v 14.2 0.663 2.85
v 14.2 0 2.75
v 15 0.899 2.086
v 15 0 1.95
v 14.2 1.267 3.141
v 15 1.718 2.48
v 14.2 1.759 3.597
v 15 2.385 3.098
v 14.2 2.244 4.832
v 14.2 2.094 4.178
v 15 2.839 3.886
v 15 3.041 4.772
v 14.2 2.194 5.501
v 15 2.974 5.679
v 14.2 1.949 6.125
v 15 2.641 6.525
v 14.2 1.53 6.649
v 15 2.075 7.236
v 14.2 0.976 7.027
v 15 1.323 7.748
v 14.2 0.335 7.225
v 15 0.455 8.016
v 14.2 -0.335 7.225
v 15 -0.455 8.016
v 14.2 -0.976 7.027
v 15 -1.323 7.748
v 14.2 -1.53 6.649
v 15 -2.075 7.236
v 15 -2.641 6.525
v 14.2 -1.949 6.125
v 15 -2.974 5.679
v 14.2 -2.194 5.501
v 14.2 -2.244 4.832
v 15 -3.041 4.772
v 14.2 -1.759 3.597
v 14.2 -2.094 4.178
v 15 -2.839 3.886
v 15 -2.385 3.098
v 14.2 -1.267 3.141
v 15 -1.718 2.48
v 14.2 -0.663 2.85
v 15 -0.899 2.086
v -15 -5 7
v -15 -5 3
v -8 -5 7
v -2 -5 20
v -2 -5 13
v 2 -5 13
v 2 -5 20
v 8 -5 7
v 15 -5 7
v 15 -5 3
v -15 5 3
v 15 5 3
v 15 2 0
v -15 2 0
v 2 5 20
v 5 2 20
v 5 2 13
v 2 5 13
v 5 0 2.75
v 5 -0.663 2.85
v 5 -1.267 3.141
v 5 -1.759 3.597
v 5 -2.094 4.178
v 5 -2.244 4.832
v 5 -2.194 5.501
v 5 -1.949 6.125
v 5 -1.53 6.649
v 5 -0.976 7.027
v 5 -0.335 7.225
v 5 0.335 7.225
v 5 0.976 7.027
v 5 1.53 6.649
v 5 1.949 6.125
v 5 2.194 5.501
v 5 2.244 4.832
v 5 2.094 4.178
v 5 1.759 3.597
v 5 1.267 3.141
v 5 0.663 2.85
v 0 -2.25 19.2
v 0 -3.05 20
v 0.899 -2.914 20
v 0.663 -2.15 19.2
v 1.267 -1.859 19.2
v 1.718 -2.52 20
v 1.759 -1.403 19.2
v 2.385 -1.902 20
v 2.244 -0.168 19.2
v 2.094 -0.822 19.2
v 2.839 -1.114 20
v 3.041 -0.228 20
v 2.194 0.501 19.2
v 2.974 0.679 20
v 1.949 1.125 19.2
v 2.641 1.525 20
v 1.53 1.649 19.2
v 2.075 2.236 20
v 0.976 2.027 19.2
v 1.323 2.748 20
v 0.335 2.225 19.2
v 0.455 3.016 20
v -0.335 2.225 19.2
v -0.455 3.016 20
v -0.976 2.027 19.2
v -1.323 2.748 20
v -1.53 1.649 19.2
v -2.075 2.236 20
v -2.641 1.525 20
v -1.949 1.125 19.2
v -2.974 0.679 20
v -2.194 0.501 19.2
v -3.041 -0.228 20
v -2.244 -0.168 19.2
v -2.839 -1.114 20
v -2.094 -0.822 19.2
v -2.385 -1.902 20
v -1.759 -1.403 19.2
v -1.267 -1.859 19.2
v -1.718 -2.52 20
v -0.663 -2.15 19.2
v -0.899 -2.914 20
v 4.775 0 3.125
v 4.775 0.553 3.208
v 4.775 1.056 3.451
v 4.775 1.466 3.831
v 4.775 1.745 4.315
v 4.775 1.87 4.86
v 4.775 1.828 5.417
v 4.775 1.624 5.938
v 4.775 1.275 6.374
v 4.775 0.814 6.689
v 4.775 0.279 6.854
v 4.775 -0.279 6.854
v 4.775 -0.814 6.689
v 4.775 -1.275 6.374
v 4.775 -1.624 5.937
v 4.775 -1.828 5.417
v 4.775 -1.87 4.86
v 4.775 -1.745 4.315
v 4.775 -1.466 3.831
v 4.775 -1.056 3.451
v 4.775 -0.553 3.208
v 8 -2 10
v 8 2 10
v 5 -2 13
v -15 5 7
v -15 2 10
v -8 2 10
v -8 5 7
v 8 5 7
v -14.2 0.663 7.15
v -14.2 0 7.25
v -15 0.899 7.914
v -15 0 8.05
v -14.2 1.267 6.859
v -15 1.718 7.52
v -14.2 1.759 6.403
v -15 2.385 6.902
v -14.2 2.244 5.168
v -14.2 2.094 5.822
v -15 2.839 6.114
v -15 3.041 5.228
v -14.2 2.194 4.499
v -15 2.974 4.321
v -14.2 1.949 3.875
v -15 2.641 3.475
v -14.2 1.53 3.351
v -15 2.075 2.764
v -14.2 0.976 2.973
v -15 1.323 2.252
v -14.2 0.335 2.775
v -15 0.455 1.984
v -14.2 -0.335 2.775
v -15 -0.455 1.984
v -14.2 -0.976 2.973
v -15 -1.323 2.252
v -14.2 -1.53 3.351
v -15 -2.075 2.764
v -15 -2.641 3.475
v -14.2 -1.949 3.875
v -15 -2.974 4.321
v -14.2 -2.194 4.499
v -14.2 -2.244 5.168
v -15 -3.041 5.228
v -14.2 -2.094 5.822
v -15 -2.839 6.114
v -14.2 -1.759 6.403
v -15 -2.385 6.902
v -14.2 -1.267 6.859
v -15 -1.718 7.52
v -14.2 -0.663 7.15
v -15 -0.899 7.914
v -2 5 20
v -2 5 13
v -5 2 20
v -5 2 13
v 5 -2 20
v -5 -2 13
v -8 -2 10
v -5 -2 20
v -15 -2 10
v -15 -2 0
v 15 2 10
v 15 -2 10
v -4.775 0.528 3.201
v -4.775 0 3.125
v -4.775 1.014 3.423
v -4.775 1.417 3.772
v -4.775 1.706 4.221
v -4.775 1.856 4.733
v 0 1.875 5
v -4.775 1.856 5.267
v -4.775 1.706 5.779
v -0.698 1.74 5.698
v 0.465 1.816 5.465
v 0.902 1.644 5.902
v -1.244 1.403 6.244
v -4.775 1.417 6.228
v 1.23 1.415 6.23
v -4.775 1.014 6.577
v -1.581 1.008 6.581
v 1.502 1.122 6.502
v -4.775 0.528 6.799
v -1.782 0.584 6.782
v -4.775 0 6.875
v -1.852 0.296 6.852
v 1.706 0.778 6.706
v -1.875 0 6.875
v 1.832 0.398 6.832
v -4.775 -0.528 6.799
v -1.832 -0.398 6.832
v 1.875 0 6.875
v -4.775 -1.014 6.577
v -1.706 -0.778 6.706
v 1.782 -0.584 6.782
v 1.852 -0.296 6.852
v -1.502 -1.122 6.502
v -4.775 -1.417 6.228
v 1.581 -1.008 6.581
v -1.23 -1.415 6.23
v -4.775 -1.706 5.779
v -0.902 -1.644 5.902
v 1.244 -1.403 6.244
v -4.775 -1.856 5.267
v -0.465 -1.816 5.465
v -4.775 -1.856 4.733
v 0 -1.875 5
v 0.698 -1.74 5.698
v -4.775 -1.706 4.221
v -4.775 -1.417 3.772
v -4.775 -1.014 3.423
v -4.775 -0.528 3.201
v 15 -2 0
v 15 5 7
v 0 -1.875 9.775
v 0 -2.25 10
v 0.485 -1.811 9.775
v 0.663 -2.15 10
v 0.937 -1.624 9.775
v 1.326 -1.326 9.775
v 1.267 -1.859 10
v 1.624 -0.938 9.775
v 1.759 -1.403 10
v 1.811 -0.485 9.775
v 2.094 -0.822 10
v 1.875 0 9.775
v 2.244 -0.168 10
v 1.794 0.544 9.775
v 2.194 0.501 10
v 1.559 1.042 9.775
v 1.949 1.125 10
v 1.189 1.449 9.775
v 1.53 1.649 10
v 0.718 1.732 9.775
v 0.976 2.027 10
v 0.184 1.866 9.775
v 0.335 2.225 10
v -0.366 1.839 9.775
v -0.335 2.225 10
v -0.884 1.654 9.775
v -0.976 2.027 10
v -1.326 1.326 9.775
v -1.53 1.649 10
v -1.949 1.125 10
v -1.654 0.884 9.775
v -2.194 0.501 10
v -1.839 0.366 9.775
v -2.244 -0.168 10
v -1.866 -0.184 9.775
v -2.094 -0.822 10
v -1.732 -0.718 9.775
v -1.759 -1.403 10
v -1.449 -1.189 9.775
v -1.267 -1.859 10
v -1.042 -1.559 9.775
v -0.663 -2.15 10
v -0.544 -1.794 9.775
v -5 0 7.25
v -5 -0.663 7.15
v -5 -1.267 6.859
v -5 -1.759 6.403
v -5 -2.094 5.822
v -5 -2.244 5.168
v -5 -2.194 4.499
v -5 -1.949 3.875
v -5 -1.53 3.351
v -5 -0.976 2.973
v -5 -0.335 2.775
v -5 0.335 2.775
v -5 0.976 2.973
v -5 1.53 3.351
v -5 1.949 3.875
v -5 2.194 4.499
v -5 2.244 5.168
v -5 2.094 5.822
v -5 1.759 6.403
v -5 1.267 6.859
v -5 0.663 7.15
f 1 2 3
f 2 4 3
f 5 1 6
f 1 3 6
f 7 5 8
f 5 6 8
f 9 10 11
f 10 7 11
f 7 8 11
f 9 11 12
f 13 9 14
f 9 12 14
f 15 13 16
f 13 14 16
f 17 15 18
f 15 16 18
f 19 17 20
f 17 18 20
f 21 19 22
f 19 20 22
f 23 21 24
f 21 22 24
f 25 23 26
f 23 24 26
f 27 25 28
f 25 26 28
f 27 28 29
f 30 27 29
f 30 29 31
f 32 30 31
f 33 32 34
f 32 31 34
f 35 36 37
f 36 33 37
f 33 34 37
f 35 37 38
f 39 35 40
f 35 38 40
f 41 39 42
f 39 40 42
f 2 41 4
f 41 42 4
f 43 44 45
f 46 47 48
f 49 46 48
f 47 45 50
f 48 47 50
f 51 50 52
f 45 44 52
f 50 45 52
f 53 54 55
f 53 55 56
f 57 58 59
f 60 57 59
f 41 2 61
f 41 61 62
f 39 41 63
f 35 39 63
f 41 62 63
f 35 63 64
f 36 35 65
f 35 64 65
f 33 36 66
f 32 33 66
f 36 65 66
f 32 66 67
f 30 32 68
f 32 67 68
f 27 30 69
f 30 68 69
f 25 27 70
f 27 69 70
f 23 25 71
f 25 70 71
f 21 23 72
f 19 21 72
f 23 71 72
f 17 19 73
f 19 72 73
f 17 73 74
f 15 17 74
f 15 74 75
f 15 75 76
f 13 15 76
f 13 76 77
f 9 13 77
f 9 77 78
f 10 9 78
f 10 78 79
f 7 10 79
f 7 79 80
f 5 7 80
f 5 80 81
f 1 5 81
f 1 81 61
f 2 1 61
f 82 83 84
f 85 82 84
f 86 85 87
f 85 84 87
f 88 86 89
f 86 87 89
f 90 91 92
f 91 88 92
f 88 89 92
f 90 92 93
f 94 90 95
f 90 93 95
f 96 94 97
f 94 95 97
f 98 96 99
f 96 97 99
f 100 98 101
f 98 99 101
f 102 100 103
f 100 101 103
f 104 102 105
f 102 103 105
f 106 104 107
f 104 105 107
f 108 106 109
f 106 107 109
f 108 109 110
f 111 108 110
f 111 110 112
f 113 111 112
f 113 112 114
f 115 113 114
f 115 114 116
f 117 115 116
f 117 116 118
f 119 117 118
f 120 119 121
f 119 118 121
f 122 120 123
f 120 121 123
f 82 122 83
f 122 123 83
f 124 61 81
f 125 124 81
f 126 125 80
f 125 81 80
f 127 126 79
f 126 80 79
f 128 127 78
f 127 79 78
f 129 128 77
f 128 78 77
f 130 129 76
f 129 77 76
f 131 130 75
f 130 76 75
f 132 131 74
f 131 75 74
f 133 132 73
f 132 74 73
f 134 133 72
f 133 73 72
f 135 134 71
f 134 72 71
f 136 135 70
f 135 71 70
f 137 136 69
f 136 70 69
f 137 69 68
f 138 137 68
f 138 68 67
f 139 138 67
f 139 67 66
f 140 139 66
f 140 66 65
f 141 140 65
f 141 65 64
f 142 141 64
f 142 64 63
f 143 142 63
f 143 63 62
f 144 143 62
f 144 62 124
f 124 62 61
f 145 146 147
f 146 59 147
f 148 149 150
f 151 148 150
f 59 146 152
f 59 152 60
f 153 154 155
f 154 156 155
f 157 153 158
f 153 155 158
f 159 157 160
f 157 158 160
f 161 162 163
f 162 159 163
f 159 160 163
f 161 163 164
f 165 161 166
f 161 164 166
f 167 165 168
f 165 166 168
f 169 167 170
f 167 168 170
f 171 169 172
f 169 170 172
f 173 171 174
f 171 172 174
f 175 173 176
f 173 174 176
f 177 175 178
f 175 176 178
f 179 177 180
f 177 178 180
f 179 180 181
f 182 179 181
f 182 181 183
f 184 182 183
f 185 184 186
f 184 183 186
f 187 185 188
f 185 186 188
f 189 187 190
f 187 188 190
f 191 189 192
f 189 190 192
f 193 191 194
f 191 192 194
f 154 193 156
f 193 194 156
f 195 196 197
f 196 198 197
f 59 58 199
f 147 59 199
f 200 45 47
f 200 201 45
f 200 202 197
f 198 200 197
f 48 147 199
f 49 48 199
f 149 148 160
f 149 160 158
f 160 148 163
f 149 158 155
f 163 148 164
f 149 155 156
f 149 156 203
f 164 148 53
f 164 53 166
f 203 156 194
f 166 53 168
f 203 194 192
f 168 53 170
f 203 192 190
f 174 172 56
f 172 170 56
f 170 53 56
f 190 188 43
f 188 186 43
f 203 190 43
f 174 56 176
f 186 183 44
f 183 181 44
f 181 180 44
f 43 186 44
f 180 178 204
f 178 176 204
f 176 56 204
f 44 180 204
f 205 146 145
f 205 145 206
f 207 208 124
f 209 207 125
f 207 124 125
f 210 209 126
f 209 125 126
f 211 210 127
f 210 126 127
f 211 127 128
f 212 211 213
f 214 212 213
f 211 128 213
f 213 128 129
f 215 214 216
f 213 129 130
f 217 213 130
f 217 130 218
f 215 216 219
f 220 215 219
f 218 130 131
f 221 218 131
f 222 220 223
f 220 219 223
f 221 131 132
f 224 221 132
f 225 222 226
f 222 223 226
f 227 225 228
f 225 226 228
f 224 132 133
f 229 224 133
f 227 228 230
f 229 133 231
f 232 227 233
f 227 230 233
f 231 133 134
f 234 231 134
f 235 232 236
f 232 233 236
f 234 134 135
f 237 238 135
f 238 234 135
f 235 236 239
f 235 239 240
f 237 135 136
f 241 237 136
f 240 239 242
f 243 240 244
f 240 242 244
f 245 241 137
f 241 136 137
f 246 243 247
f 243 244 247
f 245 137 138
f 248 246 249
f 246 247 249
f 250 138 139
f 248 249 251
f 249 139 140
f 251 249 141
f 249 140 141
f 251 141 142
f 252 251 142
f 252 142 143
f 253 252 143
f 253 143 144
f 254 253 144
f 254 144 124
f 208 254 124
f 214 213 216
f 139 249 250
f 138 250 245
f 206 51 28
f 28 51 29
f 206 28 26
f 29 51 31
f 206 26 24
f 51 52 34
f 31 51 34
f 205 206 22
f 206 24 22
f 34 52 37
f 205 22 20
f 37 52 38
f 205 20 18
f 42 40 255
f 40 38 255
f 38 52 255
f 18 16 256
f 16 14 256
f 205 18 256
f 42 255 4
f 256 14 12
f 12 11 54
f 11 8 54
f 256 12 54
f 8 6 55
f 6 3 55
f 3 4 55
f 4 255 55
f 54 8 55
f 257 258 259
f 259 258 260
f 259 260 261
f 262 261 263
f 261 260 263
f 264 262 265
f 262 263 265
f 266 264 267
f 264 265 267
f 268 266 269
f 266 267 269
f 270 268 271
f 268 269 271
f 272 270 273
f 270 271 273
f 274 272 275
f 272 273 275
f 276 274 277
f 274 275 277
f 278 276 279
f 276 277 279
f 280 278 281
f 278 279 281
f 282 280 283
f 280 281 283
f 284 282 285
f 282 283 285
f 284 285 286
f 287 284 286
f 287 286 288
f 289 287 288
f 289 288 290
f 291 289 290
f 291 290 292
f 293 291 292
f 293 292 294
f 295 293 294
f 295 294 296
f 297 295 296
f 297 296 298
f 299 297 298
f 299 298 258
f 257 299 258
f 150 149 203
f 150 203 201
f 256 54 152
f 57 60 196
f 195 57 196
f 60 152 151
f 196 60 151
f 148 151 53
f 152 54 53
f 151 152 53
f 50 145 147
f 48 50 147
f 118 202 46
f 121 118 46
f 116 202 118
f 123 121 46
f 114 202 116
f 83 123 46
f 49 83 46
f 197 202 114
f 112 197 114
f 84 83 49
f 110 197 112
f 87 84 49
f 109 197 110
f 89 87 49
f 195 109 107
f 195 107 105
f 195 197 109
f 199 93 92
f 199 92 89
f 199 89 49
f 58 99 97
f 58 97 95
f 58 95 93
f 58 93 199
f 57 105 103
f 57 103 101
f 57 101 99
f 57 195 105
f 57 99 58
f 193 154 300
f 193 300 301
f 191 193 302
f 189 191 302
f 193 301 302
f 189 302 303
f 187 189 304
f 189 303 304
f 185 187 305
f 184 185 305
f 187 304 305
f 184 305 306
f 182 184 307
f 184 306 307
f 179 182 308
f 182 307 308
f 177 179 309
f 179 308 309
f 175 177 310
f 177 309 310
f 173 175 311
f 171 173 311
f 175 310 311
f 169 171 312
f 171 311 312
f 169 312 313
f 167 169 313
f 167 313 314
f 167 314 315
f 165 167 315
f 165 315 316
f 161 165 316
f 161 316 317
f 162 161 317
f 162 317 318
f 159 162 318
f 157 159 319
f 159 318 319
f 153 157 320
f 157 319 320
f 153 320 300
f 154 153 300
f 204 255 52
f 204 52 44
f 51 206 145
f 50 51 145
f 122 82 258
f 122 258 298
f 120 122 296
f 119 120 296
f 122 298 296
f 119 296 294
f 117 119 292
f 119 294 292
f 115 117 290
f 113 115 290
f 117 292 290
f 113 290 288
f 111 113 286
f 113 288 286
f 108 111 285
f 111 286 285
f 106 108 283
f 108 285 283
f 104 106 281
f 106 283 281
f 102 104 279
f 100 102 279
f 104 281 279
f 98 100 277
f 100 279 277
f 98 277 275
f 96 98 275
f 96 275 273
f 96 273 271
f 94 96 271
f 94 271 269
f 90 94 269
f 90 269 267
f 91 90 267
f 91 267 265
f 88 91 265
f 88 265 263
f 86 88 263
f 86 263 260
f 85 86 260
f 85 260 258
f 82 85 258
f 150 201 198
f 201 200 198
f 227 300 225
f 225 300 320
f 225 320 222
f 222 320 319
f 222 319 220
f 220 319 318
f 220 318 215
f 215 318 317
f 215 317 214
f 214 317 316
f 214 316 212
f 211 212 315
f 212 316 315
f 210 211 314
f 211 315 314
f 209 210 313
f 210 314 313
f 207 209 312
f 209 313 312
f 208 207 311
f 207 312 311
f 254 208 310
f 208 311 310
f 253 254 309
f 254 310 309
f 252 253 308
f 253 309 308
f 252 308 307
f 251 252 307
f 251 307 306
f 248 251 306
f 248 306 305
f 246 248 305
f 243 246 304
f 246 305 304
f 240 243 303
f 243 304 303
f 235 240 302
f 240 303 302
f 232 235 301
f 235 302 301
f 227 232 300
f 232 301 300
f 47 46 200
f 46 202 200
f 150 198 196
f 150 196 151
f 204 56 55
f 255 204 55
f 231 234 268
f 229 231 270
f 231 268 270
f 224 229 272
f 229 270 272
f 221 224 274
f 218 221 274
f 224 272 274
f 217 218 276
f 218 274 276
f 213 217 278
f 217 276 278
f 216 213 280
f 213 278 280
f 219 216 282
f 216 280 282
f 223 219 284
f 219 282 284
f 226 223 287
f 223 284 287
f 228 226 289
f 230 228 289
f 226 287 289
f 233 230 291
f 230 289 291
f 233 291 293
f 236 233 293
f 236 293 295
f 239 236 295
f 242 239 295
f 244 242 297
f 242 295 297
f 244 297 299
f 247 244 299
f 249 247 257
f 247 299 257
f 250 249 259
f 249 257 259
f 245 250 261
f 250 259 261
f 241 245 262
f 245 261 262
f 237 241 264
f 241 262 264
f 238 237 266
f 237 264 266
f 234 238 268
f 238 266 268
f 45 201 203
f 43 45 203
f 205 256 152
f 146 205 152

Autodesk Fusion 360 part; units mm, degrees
sketch "Sketch1" plane through (0, 0, 0) normal (0, 0, 1) x (1, 0, 0)
  line L0 (15, 5) -> (-15, 5)
  line L1 (-15, 5) -> (-15, -5)
  line L2 (-15, -5) -> (15, -5)
  line L3 (15, -5) -> (15, 5)
  line L4 (15, 5) -> (-15, -5) construction
  line L5 (-15, 5) -> (15, -5) construction
  dimension "d1" = 30
  dimension "d2" = 10
extrude "Extrude1" add sketch "Sketch1" along normal blind 10
sketch "Sketch2" plane through (15, 0, 0) normal (1, 0, 0) x (0, 0, -1)
  line L0 (0, -5) -> (0, 5)
  line L1 (0, 5) -> (-10, 5)
  line L2 (-10, 5) -> (-10, -5)
  line L3 (-10, -5) -> (0, -5)
  line L4 (-5, 5) -> (-5, 0) construction
  line L5 (-5, 0) -> (0, 0) construction
  circle A0 centre (-5, 0) radius 1.875
  point P0 (-5, 0)
  dimension "d5" = 3.75
extrude "Extrude2" cut sketch "Sketch2" against normal through all contours A0
sketch "Sketch3" plane through (0, 0, 10) normal (0, 0, 1) x (1, 0, 0)
  line L0 (15, -5) -> (15, 5)
  line L1 (15, 5) -> (-15, 5)
  line L2 (-15, 5) -> (-15, -5)
  line L3 (-15, -5) -> (15, -5)
  line L4 (5, -5) -> (-5, -5)
  line L5 (-5, -5) -> (-5, 5)
  line L6 (-5, 5) -> (5, 5)
  line L7 (5, 5) -> (5, -5)
  line L8 (5, -5) -> (-5, 5) construction
  line L9 (-5, -5) -> (5, 5) construction
  dimension "d7" = 10
extrude "Extrude3" add sketch "Sketch3" along normal blind 10 contours L1 L3 L4 L5 L6 L7
sketch "Sketch4" plane through (0, 0, 20) normal (0, 0, 1) x (1, 0, 0)
  line L0 (5, 5) -> (-5, 5)
  line L1 (-5, 5) -> (-5, -5)
  line L2 (-5, -5) -> (5, -5)
  line L3 (5, -5) -> (5, 5)
  circle A0 centre (0, 0) radius 1.875
  dimension "d10" = 3.75
extrude "Extrude4" cut sketch "Sketch4" along normal up to surface contours A0 end surface at (-5, -0.1867, 3.1343)
hole "Hole1" at (15, 0, 5) direction (-1, 0, 0) diameter 4.5 depth 10 tip angle 118
hole "Hole2" at (-15, 0, 5) direction (1, 0, 0) diameter 4.5 depth 10 tip angle 118
sketch "Sketch5" plane through (0, 0, 20) normal (0, 0, 1) x (1, 0, 0)
  circle A0 centre (0, 0) radius 1.875
  line L0 (5, 5) -> (-5, 5)
  line L1 (-5, 5) -> (-5, -5)
  line L2 (-5, -5) -> (5, -5)
  line L3 (5, -5) -> (5, 5)
  circle A1 centre (0, 0) radius 1.875
hole "Hole3" at (0, 0, 20) direction (0, 0, -1) diameter 4.5 depth 10 tip angle 118
chamfer "Chamfer1" distance 3 angle 45 2 edges at (0, 5, 0) (0, -5, 0)
chamfer "Chamfer1" distance 3 angle 45 10 edges at (-10, -5, 10) (-5, -5, 15) (-5, 0, 10) (-5, 5, 15) (-10, 5, 10) (10, -5, 10) (5, -5, 15) (10, 5, 10) (5, 5, 15) (5, 0, 10)
chamfer "Chamfer2" distance 0.8 angle 45 3 edges at (-15, 2.0977, 5.8136) (15, -2.0977, 5.8136) (-2.0977, 0.8136, 20)
equation "d3 = d2"
equation "d7 = d2"
equation "d8 = d2"
equation "d10 = d5"
equation "d13 = d2"
equation "d16 = d2"
equation "d17 = d14"
equation "d19 = d2"
equation "d20 = d14"
